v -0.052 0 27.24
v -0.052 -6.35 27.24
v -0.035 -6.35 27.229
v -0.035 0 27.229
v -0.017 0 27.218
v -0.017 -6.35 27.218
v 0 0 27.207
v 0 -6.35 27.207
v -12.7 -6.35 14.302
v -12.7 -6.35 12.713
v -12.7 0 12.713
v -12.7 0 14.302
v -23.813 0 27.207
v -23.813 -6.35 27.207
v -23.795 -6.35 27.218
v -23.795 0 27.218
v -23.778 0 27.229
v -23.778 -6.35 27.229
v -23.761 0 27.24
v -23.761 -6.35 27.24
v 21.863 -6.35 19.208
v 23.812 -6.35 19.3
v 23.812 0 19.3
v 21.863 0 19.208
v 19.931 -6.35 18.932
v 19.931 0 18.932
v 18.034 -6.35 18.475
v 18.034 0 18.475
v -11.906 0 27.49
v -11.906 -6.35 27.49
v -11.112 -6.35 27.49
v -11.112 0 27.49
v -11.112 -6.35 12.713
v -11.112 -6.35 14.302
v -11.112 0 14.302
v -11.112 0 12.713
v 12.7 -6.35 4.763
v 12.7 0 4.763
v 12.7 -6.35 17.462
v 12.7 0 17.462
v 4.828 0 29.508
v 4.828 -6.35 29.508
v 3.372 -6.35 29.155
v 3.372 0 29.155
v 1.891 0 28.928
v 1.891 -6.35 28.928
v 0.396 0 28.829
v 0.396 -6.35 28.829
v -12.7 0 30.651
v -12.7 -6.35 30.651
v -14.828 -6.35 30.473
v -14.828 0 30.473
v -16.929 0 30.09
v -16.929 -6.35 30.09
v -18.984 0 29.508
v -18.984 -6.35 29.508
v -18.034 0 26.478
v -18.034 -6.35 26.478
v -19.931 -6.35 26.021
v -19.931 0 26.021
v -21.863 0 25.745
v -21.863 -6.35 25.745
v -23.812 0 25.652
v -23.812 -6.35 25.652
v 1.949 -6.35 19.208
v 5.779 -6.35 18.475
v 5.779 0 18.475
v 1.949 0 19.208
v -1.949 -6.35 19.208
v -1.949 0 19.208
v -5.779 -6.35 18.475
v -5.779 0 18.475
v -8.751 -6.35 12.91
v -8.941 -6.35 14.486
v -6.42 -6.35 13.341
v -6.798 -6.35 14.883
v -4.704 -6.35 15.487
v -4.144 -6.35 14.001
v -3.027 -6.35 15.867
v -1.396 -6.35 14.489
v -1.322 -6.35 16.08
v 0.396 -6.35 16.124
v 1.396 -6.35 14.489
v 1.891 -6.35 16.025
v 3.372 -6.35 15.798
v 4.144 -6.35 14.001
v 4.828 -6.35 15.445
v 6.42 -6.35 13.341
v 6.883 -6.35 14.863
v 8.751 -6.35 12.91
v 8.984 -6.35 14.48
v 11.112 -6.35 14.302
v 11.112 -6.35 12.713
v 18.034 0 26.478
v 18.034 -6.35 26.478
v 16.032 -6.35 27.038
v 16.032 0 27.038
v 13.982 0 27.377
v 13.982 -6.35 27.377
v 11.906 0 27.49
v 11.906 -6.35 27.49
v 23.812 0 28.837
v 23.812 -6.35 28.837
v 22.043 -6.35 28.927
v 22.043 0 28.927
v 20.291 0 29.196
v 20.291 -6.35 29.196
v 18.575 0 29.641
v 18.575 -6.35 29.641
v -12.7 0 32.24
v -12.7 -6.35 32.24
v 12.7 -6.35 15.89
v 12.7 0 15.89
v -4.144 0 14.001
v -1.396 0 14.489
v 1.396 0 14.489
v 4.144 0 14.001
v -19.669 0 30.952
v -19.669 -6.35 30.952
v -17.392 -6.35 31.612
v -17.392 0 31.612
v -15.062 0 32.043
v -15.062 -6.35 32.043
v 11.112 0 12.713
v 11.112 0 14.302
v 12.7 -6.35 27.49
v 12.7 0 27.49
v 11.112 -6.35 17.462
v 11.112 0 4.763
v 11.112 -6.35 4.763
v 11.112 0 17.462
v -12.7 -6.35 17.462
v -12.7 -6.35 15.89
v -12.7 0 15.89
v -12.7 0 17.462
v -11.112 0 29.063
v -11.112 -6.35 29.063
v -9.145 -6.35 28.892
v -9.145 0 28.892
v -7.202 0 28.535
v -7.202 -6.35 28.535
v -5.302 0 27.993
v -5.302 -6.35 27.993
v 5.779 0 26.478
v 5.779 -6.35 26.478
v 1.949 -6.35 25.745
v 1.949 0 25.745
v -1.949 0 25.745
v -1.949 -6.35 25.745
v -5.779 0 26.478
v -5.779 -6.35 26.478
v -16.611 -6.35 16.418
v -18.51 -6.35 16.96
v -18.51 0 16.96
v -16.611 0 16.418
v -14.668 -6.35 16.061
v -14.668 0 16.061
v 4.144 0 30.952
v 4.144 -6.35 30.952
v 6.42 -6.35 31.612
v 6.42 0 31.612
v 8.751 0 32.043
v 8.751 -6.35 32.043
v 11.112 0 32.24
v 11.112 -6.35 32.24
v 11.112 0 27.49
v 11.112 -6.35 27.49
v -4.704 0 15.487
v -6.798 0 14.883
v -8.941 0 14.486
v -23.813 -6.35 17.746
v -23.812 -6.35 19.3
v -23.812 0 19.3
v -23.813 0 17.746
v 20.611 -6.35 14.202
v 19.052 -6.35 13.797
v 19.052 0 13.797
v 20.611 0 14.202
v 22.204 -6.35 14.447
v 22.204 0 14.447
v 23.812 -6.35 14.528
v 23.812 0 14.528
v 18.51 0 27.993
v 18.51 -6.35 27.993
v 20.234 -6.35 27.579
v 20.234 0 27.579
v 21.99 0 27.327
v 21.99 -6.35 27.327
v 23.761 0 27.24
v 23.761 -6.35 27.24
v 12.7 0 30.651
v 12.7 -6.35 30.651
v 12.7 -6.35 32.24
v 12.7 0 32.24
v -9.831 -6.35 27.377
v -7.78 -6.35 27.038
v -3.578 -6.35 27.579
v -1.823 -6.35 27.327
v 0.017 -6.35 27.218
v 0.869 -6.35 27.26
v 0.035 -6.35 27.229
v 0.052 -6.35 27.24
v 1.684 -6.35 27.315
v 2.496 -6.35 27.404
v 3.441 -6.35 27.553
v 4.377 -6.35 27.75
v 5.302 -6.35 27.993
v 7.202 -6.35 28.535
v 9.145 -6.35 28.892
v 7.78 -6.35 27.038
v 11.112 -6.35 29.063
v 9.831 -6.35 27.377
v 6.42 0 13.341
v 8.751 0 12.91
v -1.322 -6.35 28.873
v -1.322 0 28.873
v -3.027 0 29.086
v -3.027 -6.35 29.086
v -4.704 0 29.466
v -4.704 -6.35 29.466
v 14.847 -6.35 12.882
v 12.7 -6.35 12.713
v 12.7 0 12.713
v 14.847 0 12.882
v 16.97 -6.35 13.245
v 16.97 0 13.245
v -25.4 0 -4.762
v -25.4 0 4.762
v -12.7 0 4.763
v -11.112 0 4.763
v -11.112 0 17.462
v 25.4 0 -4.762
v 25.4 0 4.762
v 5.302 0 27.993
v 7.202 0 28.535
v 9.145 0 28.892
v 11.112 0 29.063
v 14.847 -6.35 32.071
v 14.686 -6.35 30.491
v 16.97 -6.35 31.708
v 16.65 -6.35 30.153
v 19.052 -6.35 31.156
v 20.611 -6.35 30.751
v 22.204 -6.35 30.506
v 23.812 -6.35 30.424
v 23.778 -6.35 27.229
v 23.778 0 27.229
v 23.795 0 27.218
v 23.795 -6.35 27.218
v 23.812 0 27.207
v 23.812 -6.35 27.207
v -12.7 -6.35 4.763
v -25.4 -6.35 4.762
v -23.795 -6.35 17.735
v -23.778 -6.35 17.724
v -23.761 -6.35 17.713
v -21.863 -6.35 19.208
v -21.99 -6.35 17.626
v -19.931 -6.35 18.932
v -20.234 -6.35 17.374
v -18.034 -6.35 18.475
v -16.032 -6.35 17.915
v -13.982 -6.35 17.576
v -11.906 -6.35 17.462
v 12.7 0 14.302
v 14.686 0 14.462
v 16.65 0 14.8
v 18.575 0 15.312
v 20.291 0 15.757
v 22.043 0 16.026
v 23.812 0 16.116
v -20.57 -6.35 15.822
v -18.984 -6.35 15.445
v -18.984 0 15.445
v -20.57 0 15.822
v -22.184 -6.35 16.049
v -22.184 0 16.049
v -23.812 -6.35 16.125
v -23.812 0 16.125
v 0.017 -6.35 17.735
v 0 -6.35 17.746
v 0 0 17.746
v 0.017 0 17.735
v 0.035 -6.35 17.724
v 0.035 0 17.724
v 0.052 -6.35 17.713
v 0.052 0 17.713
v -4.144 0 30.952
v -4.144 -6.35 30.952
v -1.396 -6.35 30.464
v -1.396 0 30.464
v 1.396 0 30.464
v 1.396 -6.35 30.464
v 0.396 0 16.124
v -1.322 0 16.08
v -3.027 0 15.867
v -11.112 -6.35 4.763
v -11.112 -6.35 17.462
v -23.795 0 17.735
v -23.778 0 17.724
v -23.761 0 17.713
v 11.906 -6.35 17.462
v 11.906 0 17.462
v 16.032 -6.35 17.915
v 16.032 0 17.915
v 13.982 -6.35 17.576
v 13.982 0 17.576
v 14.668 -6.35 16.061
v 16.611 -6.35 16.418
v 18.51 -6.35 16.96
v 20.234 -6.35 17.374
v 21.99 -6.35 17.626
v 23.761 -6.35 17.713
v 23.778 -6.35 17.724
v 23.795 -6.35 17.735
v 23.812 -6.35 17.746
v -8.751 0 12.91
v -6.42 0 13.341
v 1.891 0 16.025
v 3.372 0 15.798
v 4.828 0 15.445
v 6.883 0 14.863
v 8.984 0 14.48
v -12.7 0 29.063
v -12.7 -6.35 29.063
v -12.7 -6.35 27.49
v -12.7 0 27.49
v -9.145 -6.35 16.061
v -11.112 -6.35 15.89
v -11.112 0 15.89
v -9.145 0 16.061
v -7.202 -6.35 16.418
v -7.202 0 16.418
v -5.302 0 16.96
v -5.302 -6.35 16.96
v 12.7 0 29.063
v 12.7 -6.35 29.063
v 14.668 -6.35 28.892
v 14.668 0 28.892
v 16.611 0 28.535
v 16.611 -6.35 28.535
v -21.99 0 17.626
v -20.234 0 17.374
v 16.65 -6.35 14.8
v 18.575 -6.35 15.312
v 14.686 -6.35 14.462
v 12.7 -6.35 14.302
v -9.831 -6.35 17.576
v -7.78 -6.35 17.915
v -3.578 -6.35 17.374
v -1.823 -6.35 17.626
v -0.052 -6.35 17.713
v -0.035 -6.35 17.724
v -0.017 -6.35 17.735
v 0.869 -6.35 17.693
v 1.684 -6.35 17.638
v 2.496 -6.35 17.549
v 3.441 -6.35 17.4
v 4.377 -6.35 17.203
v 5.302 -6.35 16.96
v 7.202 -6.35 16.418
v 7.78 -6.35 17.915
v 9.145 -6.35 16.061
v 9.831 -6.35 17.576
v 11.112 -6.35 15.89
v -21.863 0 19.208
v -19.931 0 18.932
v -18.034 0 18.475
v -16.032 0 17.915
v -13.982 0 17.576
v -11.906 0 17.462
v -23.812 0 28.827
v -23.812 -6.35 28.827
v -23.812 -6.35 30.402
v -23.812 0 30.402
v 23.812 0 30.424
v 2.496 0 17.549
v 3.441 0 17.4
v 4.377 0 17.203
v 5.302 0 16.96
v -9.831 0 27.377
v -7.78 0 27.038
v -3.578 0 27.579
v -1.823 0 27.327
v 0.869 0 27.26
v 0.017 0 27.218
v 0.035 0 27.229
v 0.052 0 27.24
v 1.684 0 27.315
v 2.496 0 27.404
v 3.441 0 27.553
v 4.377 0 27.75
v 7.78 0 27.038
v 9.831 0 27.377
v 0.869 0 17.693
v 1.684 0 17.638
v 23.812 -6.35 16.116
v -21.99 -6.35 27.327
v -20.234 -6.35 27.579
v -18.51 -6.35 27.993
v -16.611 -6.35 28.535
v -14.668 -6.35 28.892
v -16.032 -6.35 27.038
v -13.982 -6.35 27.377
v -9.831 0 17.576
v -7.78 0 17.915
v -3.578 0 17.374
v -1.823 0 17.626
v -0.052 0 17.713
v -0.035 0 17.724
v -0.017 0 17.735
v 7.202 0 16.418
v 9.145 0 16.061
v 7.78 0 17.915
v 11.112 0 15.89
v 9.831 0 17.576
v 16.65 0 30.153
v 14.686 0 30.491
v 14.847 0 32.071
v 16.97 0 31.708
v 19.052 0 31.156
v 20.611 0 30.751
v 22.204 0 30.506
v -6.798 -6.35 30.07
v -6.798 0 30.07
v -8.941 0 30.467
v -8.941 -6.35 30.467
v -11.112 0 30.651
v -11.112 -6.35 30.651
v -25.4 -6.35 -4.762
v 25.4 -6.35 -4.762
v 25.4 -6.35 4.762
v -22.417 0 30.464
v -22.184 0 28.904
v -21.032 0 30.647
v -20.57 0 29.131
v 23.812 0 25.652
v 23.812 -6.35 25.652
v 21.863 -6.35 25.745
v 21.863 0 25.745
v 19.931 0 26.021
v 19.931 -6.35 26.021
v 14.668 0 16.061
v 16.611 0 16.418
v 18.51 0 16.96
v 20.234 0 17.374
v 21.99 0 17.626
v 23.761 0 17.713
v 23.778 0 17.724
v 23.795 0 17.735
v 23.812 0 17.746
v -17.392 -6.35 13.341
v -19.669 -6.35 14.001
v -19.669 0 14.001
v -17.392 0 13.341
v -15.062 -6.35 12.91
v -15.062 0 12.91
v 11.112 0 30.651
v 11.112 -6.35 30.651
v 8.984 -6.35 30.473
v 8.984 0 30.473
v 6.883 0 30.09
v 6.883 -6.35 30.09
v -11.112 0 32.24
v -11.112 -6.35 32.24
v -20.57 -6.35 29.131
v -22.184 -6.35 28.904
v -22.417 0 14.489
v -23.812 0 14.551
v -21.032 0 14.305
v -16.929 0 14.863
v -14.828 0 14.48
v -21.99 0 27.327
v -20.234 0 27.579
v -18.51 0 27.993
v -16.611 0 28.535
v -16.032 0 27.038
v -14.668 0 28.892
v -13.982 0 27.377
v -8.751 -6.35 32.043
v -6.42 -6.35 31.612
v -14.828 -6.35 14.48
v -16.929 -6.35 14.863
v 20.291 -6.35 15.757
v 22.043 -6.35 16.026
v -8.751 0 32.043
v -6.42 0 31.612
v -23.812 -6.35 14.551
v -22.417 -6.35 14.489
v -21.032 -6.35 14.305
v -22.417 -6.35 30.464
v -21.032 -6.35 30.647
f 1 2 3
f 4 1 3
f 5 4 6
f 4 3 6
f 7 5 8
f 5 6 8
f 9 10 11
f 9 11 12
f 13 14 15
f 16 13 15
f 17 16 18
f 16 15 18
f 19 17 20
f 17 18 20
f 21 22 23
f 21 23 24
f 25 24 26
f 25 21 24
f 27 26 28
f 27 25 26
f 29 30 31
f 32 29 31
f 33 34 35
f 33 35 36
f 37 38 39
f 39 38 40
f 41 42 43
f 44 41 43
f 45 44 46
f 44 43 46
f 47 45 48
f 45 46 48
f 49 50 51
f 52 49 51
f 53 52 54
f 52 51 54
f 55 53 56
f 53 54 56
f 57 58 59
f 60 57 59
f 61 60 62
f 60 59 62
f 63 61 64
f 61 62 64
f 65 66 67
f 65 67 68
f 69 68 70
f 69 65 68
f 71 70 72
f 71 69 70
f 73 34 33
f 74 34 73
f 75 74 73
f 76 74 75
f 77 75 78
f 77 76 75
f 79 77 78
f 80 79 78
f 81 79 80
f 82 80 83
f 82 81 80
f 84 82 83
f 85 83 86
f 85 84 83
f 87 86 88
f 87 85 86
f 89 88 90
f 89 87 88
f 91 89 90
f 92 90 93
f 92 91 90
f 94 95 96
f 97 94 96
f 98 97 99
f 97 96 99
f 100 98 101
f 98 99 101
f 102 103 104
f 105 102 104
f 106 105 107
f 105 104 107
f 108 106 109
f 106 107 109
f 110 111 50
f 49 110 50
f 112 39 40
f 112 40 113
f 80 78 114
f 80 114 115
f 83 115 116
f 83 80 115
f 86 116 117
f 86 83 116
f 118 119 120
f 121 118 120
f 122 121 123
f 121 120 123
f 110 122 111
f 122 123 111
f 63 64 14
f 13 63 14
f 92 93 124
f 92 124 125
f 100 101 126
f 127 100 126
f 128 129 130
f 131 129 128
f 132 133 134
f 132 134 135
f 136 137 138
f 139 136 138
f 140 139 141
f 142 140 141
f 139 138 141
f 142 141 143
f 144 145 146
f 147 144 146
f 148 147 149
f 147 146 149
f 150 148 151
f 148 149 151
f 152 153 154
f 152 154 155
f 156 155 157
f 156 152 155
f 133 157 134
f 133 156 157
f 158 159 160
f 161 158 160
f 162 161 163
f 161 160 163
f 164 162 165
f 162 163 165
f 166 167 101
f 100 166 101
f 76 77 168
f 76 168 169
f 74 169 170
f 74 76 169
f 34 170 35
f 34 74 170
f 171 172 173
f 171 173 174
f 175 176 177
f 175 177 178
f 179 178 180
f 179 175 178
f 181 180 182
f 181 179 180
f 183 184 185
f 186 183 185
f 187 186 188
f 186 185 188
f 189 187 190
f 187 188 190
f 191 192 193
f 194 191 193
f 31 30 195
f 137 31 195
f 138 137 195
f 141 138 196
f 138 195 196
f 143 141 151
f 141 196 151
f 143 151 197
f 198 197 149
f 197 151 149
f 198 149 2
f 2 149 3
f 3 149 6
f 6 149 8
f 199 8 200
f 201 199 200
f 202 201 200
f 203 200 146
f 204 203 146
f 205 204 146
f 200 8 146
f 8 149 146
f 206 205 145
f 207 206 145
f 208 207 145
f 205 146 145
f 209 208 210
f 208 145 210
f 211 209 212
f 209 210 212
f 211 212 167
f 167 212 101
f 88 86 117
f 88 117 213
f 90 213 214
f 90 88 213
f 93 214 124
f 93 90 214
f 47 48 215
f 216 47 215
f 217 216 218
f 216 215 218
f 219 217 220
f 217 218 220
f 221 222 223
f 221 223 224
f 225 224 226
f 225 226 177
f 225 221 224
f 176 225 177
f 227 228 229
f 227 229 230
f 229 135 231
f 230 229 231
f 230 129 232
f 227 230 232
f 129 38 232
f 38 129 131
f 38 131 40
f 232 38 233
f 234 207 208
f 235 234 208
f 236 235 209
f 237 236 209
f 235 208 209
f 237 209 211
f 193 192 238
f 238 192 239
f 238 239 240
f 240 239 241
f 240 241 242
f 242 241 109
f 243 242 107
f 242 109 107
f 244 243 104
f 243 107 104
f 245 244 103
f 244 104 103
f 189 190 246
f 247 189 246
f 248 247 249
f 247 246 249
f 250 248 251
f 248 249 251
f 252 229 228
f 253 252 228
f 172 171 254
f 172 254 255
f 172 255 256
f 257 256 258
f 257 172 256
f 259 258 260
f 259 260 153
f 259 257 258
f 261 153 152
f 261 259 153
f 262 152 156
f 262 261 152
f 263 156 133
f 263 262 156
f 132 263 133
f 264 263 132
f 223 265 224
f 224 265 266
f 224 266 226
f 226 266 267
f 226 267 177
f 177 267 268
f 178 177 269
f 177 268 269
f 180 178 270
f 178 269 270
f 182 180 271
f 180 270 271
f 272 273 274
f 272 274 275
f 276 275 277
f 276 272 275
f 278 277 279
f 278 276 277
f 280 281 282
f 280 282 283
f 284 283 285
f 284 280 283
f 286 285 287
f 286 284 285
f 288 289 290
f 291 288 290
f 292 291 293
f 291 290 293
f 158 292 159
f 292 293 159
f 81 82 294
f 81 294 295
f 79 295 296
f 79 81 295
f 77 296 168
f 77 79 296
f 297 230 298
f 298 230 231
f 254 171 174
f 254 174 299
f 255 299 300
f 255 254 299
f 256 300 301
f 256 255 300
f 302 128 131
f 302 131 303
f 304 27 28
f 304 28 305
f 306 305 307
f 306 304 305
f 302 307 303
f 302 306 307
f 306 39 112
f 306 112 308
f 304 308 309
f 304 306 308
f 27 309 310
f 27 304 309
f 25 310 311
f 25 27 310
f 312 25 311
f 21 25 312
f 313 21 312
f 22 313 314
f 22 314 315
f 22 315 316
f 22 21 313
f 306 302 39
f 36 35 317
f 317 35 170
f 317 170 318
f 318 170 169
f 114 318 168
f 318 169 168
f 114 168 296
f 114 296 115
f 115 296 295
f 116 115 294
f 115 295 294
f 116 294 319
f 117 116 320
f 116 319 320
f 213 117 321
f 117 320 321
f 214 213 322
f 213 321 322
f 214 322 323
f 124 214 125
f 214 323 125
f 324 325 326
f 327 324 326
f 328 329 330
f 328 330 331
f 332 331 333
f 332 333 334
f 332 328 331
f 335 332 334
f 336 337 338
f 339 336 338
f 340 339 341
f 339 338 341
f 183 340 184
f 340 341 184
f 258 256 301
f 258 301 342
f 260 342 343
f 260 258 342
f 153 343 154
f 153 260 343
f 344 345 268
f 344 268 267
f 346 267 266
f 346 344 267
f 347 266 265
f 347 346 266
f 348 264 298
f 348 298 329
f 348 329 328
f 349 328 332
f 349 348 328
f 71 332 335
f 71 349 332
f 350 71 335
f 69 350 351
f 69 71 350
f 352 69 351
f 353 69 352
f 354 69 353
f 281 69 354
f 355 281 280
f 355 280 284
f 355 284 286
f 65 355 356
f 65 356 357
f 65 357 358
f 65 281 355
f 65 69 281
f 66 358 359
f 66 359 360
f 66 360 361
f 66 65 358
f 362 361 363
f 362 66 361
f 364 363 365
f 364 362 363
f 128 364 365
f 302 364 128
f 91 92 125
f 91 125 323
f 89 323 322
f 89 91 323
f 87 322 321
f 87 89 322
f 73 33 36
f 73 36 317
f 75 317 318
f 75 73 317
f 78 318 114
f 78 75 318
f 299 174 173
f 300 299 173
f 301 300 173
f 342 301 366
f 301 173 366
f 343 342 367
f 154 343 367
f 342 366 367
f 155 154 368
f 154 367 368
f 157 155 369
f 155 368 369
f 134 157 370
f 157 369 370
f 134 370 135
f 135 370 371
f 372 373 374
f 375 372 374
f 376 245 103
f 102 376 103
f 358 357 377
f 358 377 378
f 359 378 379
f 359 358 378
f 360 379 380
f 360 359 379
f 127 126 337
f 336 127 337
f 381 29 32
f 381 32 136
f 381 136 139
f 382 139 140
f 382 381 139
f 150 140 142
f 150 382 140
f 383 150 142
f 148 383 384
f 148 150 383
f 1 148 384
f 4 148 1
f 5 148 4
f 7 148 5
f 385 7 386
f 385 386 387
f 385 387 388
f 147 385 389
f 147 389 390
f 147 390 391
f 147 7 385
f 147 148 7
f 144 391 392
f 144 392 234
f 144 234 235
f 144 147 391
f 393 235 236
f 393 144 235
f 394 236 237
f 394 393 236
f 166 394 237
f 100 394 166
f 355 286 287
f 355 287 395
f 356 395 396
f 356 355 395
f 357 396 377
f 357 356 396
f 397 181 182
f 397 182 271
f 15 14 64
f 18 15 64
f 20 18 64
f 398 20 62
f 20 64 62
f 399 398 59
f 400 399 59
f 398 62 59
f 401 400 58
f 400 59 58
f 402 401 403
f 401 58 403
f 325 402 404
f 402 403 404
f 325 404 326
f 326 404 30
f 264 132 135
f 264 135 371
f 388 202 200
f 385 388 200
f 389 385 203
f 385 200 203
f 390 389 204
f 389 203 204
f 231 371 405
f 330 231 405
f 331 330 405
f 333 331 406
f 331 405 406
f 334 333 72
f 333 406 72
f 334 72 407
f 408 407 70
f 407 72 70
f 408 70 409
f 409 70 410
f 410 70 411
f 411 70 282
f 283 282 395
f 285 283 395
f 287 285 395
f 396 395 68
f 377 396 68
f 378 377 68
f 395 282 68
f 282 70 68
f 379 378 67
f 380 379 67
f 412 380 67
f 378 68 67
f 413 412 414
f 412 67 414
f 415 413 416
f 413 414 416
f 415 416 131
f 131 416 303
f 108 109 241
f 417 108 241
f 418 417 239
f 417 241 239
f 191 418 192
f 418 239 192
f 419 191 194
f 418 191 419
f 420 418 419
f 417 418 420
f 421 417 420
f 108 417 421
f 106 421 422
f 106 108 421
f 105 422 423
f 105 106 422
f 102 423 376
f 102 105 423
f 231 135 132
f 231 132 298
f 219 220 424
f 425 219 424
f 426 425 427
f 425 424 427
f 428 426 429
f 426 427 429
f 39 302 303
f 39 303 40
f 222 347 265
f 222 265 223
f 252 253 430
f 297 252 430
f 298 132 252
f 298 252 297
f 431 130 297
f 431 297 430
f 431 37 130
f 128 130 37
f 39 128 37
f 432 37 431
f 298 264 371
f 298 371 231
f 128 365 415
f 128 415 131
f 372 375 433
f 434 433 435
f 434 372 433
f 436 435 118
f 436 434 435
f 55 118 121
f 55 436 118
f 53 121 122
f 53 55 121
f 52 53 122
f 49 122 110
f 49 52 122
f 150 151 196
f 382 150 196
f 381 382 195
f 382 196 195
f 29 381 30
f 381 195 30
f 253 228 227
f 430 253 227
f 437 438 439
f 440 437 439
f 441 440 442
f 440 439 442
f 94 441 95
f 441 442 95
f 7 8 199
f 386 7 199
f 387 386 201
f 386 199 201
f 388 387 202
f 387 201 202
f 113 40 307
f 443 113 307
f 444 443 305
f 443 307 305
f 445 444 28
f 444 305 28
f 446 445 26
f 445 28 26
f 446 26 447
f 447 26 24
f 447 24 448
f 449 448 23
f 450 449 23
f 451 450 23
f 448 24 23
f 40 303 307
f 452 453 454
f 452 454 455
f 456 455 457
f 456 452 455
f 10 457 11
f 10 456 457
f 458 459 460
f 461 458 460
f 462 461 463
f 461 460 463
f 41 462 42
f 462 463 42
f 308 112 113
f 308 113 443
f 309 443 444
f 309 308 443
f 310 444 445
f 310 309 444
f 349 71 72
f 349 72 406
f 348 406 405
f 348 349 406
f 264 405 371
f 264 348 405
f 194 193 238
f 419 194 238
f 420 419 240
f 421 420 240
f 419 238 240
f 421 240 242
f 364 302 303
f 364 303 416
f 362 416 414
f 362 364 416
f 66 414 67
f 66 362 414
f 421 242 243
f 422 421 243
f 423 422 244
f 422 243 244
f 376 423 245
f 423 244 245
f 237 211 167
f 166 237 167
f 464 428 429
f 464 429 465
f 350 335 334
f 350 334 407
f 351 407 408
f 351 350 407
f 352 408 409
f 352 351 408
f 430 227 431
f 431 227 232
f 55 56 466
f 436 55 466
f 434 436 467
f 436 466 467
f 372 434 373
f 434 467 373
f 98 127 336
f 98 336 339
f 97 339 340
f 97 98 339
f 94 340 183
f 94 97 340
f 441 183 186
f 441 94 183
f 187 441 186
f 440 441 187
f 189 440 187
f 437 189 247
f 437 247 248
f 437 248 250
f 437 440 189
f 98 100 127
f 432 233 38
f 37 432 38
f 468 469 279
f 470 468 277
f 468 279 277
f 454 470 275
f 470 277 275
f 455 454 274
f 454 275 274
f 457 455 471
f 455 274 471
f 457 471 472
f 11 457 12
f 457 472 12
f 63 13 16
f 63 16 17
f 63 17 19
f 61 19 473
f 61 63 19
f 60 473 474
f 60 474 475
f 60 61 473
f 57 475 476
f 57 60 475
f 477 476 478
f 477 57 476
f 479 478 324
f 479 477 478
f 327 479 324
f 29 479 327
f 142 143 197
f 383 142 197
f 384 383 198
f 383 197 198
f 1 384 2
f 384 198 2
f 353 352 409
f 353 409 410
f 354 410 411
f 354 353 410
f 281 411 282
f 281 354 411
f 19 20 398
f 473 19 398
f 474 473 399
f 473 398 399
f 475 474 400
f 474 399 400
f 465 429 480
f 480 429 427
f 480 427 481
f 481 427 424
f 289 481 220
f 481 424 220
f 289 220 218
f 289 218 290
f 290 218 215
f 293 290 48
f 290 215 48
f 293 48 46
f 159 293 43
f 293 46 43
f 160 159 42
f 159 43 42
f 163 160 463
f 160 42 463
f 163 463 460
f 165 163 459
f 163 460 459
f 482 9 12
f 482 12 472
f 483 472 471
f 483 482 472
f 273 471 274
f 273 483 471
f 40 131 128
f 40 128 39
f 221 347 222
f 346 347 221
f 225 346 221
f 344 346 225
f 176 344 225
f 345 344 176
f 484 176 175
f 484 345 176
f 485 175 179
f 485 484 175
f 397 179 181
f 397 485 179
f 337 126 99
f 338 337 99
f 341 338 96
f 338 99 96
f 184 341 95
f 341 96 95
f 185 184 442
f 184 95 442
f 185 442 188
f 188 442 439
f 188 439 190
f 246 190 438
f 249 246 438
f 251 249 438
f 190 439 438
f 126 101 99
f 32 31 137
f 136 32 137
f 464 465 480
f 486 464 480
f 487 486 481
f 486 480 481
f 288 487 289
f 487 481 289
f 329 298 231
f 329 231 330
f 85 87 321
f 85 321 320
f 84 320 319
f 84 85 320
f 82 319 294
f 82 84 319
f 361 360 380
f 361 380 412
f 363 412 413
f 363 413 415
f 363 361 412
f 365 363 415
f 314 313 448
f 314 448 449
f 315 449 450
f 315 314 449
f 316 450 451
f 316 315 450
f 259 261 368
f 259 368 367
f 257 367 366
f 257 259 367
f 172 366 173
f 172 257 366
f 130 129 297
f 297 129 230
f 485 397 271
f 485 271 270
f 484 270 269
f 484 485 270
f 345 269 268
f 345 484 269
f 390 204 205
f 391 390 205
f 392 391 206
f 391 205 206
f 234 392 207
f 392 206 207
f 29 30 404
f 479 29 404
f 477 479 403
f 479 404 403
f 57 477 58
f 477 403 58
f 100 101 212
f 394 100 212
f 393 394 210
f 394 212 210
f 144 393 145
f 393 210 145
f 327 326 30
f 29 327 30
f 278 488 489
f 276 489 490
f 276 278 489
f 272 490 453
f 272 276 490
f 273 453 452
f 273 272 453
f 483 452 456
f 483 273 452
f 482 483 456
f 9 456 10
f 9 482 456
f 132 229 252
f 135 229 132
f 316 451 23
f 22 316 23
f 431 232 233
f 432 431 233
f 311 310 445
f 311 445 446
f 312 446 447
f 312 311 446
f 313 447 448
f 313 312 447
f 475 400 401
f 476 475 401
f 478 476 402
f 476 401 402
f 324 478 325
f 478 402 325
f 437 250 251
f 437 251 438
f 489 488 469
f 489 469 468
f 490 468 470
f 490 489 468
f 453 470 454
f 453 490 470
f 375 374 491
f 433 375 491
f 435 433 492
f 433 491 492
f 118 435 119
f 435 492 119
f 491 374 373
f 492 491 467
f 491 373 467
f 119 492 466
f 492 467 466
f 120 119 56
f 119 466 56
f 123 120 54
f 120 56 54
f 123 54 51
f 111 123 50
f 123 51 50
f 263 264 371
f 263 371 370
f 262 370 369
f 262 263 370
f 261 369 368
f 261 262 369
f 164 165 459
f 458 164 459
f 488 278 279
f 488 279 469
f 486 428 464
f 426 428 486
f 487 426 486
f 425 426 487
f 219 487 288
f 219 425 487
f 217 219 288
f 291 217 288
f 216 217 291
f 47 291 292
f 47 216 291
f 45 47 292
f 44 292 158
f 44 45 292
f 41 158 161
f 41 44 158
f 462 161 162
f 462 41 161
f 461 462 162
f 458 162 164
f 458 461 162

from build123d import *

# Parameters (mm, degrees)
F0_W     = 1.5875
F0_H     = 12.7
F1_DEPTH = 6.35
F3_DEPTH = 6.35


with BuildPart() as f1:
    # F0 (on Front) → F1 (new body)
    with BuildSketch(Plane.XZ):
        Polygon((-25.4, -4.7625), (25.4, -4.7625), (25.4, 4.7625), (12.7, 4.7625), (11.1125, 4.7625), (-11.1125, 4.7625), (-12.7, 4.7625), (-25.4, 4.7625), align=None)
        with Locations((11.90625, 11.1125)):
            Rectangle(F0_W, F0_H)
        with Locations((-11.90625, 11.1125)):
            Rectangle(F0_W, F0_H)
    extrude(amount=F1_DEPTH)


with BuildPart() as f3:
    # F2 (on face) → F3 (new body)
    with BuildSketch(Plane.XZ.offset(6.35)):
        with BuildLine():
            ThreePointArc((-11.90625, 17.4625), (-15.011546, 17.717297), (-18.033773, 18.474874))
            ThreePointArc((-18.033773, 18.474874), (-20.8938, 19.093006), (-23.8125, 19.30044))
            Line((-23.8125, 19.30044), (-23.8125, 17.745725))
            ThreePointArc((-23.8125, 17.745725), (-23.786538, 17.729279), (-23.760553, 17.712869))
            ThreePointArc((-23.760553, 17.712869), (-21.109077, 17.52014), (-18.51025, 16.96017))
            ThreePointArc((-18.51025, 16.96017), (-15.643608, 16.21623), (-12.7, 15.89027))
            Line((-12.7, 15.89027), (-12.7, 17.4625))
            Line((-12.7, 17.4625), (-11.90625, 17.4625))
        make_face()
        with BuildLine():
            Line((-12.7, 12.713233), (-12.7, 14.301679))
            ThreePointArc((-12.7, 14.301679), (-15.883309, 14.646233), (-18.984072, 15.444632))
            ThreePointArc((-18.984072, 15.444632), (-21.374406, 15.9544), (-23.8125, 16.12544))
            Line((-23.8125, 16.12544), (-23.8125, 14.55064))
            ThreePointArc((-23.8125, 14.55064), (-21.722425, 14.412562), (-19.668678, 14.000728))
            ThreePointArc((-19.668678, 14.000728), (-16.232502, 13.096294), (-12.7, 12.713233))
        make_face()
        with BuildLine():
            ThreePointArc((-5.778727, 18.474874), (-8.800954, 17.717297), (-11.90625, 17.4625))
            Line((-11.90625, 17.4625), (-11.1125, 17.4625))
            Line((-11.1125, 17.4625), (-11.1125, 15.89027))
            ThreePointArc((-11.1125, 15.89027), (-8.168892, 16.21623), (-5.30225, 16.96017))
            ThreePointArc((-5.30225, 16.96017), (-2.703423, 17.52014), (-0.051947, 17.712869))
            ThreePointArc((-0.051947, 17.712869), (-0.025962, 17.729279), (0, 17.745725))
            ThreePointArc((0, 17.745725), (0.025962, 17.729279), (0.051947, 17.712869))
            ThreePointArc((0.051947, 17.712869), (1.276394, 17.670131), (2.495562, 17.548772))
            ThreePointArc((2.495562, 17.548772), (3.909998, 17.307361), (5.30225, 16.96017))
            ThreePointArc((5.30225, 16.96017), (8.168892, 16.21623), (11.1125, 15.89027))
            Line((11.1125, 15.89027), (11.1125, 17.4625))
            Line((11.1125, 17.4625), (11.90625, 17.4625))
            ThreePointArc((11.90625, 17.4625), (8.800954, 17.717297), (5.778727, 18.474874))
            ThreePointArc((5.778727, 18.474874), (0, 19.30044), (-5.778727, 18.474874))
        make_face()
        with BuildLine():
            ThreePointArc((-4.703763, 15.486925), (-7.864449, 14.658107), (-11.1125, 14.301679))
            Line((-11.1125, 14.301679), (-11.1125, 12.713233))
            ThreePointArc((-11.1125, 12.713233), (-7.579998, 13.096294), (-4.143822, 14.000728))
            ThreePointArc((-4.143822, 14.000728), (0, 14.55064), (4.143822, 14.000728))
            ThreePointArc((4.143822, 14.000728), (7.579998, 13.096294), (11.1125, 12.713233))
            Line((11.1125, 12.713233), (11.1125, 14.301679))
            ThreePointArc((11.1125, 14.301679), (7.929191, 14.646233), (4.828428, 15.444632))
            ThreePointArc((4.828428, 15.444632), (2.634241, 15.927257), (0.39625, 16.124178))
            ThreePointArc((0.39625, 16.124178), (-2.17733, 15.994212), (-4.703763, 15.486925))
        make_face()
        with BuildLine():
            ThreePointArc((18.033773, 18.474874), (15.011546, 17.717297), (11.90625, 17.4625))
            Line((11.90625, 17.4625), (12.7, 17.4625))
            Line((12.7, 17.4625), (12.7, 15.89027))
            ThreePointArc((12.7, 15.89027), (15.643608, 16.21623), (18.51025, 16.96017))
            ThreePointArc((18.51025, 16.96017), (21.109077, 17.52014), (23.760553, 17.712869))
            ThreePointArc((23.760553, 17.712869), (23.786538, 17.729279), (23.8125, 17.745725))
            Line((23.8125, 17.745725), (23.8125, 19.30044))
            ThreePointArc((23.8125, 19.30044), (20.8938, 19.093006), (18.033773, 18.474874))
        make_face()
        with BuildLine():
            ThreePointArc((18.575337, 15.3117), (15.671688, 14.608799), (12.7, 14.301679))
            Line((12.7, 14.301679), (12.7, 12.713233))
            ThreePointArc((12.7, 12.713233), (15.91269, 13.03946), (19.051701, 13.797358))
            ThreePointArc((19.051701, 13.797358), (21.404193, 14.344645), (23.8125, 14.528494))
            Line((23.8125, 14.528494), (23.8125, 16.115994))
            ThreePointArc((23.8125, 16.115994), (21.163219, 15.913749), (18.575337, 15.3117))
        make_face()
    extrude(amount=-F3_DEPTH)


with BuildPart() as f5_1:
    # F5: instance of F3
    add(f3.part.mirror(Plane(origin=(0, -3.175, 22.47646), x_dir=(1, 0, 0), z_dir=(0, 0, -1))))


solid = Compound([f1.part, f3.part, f5_1.part])
